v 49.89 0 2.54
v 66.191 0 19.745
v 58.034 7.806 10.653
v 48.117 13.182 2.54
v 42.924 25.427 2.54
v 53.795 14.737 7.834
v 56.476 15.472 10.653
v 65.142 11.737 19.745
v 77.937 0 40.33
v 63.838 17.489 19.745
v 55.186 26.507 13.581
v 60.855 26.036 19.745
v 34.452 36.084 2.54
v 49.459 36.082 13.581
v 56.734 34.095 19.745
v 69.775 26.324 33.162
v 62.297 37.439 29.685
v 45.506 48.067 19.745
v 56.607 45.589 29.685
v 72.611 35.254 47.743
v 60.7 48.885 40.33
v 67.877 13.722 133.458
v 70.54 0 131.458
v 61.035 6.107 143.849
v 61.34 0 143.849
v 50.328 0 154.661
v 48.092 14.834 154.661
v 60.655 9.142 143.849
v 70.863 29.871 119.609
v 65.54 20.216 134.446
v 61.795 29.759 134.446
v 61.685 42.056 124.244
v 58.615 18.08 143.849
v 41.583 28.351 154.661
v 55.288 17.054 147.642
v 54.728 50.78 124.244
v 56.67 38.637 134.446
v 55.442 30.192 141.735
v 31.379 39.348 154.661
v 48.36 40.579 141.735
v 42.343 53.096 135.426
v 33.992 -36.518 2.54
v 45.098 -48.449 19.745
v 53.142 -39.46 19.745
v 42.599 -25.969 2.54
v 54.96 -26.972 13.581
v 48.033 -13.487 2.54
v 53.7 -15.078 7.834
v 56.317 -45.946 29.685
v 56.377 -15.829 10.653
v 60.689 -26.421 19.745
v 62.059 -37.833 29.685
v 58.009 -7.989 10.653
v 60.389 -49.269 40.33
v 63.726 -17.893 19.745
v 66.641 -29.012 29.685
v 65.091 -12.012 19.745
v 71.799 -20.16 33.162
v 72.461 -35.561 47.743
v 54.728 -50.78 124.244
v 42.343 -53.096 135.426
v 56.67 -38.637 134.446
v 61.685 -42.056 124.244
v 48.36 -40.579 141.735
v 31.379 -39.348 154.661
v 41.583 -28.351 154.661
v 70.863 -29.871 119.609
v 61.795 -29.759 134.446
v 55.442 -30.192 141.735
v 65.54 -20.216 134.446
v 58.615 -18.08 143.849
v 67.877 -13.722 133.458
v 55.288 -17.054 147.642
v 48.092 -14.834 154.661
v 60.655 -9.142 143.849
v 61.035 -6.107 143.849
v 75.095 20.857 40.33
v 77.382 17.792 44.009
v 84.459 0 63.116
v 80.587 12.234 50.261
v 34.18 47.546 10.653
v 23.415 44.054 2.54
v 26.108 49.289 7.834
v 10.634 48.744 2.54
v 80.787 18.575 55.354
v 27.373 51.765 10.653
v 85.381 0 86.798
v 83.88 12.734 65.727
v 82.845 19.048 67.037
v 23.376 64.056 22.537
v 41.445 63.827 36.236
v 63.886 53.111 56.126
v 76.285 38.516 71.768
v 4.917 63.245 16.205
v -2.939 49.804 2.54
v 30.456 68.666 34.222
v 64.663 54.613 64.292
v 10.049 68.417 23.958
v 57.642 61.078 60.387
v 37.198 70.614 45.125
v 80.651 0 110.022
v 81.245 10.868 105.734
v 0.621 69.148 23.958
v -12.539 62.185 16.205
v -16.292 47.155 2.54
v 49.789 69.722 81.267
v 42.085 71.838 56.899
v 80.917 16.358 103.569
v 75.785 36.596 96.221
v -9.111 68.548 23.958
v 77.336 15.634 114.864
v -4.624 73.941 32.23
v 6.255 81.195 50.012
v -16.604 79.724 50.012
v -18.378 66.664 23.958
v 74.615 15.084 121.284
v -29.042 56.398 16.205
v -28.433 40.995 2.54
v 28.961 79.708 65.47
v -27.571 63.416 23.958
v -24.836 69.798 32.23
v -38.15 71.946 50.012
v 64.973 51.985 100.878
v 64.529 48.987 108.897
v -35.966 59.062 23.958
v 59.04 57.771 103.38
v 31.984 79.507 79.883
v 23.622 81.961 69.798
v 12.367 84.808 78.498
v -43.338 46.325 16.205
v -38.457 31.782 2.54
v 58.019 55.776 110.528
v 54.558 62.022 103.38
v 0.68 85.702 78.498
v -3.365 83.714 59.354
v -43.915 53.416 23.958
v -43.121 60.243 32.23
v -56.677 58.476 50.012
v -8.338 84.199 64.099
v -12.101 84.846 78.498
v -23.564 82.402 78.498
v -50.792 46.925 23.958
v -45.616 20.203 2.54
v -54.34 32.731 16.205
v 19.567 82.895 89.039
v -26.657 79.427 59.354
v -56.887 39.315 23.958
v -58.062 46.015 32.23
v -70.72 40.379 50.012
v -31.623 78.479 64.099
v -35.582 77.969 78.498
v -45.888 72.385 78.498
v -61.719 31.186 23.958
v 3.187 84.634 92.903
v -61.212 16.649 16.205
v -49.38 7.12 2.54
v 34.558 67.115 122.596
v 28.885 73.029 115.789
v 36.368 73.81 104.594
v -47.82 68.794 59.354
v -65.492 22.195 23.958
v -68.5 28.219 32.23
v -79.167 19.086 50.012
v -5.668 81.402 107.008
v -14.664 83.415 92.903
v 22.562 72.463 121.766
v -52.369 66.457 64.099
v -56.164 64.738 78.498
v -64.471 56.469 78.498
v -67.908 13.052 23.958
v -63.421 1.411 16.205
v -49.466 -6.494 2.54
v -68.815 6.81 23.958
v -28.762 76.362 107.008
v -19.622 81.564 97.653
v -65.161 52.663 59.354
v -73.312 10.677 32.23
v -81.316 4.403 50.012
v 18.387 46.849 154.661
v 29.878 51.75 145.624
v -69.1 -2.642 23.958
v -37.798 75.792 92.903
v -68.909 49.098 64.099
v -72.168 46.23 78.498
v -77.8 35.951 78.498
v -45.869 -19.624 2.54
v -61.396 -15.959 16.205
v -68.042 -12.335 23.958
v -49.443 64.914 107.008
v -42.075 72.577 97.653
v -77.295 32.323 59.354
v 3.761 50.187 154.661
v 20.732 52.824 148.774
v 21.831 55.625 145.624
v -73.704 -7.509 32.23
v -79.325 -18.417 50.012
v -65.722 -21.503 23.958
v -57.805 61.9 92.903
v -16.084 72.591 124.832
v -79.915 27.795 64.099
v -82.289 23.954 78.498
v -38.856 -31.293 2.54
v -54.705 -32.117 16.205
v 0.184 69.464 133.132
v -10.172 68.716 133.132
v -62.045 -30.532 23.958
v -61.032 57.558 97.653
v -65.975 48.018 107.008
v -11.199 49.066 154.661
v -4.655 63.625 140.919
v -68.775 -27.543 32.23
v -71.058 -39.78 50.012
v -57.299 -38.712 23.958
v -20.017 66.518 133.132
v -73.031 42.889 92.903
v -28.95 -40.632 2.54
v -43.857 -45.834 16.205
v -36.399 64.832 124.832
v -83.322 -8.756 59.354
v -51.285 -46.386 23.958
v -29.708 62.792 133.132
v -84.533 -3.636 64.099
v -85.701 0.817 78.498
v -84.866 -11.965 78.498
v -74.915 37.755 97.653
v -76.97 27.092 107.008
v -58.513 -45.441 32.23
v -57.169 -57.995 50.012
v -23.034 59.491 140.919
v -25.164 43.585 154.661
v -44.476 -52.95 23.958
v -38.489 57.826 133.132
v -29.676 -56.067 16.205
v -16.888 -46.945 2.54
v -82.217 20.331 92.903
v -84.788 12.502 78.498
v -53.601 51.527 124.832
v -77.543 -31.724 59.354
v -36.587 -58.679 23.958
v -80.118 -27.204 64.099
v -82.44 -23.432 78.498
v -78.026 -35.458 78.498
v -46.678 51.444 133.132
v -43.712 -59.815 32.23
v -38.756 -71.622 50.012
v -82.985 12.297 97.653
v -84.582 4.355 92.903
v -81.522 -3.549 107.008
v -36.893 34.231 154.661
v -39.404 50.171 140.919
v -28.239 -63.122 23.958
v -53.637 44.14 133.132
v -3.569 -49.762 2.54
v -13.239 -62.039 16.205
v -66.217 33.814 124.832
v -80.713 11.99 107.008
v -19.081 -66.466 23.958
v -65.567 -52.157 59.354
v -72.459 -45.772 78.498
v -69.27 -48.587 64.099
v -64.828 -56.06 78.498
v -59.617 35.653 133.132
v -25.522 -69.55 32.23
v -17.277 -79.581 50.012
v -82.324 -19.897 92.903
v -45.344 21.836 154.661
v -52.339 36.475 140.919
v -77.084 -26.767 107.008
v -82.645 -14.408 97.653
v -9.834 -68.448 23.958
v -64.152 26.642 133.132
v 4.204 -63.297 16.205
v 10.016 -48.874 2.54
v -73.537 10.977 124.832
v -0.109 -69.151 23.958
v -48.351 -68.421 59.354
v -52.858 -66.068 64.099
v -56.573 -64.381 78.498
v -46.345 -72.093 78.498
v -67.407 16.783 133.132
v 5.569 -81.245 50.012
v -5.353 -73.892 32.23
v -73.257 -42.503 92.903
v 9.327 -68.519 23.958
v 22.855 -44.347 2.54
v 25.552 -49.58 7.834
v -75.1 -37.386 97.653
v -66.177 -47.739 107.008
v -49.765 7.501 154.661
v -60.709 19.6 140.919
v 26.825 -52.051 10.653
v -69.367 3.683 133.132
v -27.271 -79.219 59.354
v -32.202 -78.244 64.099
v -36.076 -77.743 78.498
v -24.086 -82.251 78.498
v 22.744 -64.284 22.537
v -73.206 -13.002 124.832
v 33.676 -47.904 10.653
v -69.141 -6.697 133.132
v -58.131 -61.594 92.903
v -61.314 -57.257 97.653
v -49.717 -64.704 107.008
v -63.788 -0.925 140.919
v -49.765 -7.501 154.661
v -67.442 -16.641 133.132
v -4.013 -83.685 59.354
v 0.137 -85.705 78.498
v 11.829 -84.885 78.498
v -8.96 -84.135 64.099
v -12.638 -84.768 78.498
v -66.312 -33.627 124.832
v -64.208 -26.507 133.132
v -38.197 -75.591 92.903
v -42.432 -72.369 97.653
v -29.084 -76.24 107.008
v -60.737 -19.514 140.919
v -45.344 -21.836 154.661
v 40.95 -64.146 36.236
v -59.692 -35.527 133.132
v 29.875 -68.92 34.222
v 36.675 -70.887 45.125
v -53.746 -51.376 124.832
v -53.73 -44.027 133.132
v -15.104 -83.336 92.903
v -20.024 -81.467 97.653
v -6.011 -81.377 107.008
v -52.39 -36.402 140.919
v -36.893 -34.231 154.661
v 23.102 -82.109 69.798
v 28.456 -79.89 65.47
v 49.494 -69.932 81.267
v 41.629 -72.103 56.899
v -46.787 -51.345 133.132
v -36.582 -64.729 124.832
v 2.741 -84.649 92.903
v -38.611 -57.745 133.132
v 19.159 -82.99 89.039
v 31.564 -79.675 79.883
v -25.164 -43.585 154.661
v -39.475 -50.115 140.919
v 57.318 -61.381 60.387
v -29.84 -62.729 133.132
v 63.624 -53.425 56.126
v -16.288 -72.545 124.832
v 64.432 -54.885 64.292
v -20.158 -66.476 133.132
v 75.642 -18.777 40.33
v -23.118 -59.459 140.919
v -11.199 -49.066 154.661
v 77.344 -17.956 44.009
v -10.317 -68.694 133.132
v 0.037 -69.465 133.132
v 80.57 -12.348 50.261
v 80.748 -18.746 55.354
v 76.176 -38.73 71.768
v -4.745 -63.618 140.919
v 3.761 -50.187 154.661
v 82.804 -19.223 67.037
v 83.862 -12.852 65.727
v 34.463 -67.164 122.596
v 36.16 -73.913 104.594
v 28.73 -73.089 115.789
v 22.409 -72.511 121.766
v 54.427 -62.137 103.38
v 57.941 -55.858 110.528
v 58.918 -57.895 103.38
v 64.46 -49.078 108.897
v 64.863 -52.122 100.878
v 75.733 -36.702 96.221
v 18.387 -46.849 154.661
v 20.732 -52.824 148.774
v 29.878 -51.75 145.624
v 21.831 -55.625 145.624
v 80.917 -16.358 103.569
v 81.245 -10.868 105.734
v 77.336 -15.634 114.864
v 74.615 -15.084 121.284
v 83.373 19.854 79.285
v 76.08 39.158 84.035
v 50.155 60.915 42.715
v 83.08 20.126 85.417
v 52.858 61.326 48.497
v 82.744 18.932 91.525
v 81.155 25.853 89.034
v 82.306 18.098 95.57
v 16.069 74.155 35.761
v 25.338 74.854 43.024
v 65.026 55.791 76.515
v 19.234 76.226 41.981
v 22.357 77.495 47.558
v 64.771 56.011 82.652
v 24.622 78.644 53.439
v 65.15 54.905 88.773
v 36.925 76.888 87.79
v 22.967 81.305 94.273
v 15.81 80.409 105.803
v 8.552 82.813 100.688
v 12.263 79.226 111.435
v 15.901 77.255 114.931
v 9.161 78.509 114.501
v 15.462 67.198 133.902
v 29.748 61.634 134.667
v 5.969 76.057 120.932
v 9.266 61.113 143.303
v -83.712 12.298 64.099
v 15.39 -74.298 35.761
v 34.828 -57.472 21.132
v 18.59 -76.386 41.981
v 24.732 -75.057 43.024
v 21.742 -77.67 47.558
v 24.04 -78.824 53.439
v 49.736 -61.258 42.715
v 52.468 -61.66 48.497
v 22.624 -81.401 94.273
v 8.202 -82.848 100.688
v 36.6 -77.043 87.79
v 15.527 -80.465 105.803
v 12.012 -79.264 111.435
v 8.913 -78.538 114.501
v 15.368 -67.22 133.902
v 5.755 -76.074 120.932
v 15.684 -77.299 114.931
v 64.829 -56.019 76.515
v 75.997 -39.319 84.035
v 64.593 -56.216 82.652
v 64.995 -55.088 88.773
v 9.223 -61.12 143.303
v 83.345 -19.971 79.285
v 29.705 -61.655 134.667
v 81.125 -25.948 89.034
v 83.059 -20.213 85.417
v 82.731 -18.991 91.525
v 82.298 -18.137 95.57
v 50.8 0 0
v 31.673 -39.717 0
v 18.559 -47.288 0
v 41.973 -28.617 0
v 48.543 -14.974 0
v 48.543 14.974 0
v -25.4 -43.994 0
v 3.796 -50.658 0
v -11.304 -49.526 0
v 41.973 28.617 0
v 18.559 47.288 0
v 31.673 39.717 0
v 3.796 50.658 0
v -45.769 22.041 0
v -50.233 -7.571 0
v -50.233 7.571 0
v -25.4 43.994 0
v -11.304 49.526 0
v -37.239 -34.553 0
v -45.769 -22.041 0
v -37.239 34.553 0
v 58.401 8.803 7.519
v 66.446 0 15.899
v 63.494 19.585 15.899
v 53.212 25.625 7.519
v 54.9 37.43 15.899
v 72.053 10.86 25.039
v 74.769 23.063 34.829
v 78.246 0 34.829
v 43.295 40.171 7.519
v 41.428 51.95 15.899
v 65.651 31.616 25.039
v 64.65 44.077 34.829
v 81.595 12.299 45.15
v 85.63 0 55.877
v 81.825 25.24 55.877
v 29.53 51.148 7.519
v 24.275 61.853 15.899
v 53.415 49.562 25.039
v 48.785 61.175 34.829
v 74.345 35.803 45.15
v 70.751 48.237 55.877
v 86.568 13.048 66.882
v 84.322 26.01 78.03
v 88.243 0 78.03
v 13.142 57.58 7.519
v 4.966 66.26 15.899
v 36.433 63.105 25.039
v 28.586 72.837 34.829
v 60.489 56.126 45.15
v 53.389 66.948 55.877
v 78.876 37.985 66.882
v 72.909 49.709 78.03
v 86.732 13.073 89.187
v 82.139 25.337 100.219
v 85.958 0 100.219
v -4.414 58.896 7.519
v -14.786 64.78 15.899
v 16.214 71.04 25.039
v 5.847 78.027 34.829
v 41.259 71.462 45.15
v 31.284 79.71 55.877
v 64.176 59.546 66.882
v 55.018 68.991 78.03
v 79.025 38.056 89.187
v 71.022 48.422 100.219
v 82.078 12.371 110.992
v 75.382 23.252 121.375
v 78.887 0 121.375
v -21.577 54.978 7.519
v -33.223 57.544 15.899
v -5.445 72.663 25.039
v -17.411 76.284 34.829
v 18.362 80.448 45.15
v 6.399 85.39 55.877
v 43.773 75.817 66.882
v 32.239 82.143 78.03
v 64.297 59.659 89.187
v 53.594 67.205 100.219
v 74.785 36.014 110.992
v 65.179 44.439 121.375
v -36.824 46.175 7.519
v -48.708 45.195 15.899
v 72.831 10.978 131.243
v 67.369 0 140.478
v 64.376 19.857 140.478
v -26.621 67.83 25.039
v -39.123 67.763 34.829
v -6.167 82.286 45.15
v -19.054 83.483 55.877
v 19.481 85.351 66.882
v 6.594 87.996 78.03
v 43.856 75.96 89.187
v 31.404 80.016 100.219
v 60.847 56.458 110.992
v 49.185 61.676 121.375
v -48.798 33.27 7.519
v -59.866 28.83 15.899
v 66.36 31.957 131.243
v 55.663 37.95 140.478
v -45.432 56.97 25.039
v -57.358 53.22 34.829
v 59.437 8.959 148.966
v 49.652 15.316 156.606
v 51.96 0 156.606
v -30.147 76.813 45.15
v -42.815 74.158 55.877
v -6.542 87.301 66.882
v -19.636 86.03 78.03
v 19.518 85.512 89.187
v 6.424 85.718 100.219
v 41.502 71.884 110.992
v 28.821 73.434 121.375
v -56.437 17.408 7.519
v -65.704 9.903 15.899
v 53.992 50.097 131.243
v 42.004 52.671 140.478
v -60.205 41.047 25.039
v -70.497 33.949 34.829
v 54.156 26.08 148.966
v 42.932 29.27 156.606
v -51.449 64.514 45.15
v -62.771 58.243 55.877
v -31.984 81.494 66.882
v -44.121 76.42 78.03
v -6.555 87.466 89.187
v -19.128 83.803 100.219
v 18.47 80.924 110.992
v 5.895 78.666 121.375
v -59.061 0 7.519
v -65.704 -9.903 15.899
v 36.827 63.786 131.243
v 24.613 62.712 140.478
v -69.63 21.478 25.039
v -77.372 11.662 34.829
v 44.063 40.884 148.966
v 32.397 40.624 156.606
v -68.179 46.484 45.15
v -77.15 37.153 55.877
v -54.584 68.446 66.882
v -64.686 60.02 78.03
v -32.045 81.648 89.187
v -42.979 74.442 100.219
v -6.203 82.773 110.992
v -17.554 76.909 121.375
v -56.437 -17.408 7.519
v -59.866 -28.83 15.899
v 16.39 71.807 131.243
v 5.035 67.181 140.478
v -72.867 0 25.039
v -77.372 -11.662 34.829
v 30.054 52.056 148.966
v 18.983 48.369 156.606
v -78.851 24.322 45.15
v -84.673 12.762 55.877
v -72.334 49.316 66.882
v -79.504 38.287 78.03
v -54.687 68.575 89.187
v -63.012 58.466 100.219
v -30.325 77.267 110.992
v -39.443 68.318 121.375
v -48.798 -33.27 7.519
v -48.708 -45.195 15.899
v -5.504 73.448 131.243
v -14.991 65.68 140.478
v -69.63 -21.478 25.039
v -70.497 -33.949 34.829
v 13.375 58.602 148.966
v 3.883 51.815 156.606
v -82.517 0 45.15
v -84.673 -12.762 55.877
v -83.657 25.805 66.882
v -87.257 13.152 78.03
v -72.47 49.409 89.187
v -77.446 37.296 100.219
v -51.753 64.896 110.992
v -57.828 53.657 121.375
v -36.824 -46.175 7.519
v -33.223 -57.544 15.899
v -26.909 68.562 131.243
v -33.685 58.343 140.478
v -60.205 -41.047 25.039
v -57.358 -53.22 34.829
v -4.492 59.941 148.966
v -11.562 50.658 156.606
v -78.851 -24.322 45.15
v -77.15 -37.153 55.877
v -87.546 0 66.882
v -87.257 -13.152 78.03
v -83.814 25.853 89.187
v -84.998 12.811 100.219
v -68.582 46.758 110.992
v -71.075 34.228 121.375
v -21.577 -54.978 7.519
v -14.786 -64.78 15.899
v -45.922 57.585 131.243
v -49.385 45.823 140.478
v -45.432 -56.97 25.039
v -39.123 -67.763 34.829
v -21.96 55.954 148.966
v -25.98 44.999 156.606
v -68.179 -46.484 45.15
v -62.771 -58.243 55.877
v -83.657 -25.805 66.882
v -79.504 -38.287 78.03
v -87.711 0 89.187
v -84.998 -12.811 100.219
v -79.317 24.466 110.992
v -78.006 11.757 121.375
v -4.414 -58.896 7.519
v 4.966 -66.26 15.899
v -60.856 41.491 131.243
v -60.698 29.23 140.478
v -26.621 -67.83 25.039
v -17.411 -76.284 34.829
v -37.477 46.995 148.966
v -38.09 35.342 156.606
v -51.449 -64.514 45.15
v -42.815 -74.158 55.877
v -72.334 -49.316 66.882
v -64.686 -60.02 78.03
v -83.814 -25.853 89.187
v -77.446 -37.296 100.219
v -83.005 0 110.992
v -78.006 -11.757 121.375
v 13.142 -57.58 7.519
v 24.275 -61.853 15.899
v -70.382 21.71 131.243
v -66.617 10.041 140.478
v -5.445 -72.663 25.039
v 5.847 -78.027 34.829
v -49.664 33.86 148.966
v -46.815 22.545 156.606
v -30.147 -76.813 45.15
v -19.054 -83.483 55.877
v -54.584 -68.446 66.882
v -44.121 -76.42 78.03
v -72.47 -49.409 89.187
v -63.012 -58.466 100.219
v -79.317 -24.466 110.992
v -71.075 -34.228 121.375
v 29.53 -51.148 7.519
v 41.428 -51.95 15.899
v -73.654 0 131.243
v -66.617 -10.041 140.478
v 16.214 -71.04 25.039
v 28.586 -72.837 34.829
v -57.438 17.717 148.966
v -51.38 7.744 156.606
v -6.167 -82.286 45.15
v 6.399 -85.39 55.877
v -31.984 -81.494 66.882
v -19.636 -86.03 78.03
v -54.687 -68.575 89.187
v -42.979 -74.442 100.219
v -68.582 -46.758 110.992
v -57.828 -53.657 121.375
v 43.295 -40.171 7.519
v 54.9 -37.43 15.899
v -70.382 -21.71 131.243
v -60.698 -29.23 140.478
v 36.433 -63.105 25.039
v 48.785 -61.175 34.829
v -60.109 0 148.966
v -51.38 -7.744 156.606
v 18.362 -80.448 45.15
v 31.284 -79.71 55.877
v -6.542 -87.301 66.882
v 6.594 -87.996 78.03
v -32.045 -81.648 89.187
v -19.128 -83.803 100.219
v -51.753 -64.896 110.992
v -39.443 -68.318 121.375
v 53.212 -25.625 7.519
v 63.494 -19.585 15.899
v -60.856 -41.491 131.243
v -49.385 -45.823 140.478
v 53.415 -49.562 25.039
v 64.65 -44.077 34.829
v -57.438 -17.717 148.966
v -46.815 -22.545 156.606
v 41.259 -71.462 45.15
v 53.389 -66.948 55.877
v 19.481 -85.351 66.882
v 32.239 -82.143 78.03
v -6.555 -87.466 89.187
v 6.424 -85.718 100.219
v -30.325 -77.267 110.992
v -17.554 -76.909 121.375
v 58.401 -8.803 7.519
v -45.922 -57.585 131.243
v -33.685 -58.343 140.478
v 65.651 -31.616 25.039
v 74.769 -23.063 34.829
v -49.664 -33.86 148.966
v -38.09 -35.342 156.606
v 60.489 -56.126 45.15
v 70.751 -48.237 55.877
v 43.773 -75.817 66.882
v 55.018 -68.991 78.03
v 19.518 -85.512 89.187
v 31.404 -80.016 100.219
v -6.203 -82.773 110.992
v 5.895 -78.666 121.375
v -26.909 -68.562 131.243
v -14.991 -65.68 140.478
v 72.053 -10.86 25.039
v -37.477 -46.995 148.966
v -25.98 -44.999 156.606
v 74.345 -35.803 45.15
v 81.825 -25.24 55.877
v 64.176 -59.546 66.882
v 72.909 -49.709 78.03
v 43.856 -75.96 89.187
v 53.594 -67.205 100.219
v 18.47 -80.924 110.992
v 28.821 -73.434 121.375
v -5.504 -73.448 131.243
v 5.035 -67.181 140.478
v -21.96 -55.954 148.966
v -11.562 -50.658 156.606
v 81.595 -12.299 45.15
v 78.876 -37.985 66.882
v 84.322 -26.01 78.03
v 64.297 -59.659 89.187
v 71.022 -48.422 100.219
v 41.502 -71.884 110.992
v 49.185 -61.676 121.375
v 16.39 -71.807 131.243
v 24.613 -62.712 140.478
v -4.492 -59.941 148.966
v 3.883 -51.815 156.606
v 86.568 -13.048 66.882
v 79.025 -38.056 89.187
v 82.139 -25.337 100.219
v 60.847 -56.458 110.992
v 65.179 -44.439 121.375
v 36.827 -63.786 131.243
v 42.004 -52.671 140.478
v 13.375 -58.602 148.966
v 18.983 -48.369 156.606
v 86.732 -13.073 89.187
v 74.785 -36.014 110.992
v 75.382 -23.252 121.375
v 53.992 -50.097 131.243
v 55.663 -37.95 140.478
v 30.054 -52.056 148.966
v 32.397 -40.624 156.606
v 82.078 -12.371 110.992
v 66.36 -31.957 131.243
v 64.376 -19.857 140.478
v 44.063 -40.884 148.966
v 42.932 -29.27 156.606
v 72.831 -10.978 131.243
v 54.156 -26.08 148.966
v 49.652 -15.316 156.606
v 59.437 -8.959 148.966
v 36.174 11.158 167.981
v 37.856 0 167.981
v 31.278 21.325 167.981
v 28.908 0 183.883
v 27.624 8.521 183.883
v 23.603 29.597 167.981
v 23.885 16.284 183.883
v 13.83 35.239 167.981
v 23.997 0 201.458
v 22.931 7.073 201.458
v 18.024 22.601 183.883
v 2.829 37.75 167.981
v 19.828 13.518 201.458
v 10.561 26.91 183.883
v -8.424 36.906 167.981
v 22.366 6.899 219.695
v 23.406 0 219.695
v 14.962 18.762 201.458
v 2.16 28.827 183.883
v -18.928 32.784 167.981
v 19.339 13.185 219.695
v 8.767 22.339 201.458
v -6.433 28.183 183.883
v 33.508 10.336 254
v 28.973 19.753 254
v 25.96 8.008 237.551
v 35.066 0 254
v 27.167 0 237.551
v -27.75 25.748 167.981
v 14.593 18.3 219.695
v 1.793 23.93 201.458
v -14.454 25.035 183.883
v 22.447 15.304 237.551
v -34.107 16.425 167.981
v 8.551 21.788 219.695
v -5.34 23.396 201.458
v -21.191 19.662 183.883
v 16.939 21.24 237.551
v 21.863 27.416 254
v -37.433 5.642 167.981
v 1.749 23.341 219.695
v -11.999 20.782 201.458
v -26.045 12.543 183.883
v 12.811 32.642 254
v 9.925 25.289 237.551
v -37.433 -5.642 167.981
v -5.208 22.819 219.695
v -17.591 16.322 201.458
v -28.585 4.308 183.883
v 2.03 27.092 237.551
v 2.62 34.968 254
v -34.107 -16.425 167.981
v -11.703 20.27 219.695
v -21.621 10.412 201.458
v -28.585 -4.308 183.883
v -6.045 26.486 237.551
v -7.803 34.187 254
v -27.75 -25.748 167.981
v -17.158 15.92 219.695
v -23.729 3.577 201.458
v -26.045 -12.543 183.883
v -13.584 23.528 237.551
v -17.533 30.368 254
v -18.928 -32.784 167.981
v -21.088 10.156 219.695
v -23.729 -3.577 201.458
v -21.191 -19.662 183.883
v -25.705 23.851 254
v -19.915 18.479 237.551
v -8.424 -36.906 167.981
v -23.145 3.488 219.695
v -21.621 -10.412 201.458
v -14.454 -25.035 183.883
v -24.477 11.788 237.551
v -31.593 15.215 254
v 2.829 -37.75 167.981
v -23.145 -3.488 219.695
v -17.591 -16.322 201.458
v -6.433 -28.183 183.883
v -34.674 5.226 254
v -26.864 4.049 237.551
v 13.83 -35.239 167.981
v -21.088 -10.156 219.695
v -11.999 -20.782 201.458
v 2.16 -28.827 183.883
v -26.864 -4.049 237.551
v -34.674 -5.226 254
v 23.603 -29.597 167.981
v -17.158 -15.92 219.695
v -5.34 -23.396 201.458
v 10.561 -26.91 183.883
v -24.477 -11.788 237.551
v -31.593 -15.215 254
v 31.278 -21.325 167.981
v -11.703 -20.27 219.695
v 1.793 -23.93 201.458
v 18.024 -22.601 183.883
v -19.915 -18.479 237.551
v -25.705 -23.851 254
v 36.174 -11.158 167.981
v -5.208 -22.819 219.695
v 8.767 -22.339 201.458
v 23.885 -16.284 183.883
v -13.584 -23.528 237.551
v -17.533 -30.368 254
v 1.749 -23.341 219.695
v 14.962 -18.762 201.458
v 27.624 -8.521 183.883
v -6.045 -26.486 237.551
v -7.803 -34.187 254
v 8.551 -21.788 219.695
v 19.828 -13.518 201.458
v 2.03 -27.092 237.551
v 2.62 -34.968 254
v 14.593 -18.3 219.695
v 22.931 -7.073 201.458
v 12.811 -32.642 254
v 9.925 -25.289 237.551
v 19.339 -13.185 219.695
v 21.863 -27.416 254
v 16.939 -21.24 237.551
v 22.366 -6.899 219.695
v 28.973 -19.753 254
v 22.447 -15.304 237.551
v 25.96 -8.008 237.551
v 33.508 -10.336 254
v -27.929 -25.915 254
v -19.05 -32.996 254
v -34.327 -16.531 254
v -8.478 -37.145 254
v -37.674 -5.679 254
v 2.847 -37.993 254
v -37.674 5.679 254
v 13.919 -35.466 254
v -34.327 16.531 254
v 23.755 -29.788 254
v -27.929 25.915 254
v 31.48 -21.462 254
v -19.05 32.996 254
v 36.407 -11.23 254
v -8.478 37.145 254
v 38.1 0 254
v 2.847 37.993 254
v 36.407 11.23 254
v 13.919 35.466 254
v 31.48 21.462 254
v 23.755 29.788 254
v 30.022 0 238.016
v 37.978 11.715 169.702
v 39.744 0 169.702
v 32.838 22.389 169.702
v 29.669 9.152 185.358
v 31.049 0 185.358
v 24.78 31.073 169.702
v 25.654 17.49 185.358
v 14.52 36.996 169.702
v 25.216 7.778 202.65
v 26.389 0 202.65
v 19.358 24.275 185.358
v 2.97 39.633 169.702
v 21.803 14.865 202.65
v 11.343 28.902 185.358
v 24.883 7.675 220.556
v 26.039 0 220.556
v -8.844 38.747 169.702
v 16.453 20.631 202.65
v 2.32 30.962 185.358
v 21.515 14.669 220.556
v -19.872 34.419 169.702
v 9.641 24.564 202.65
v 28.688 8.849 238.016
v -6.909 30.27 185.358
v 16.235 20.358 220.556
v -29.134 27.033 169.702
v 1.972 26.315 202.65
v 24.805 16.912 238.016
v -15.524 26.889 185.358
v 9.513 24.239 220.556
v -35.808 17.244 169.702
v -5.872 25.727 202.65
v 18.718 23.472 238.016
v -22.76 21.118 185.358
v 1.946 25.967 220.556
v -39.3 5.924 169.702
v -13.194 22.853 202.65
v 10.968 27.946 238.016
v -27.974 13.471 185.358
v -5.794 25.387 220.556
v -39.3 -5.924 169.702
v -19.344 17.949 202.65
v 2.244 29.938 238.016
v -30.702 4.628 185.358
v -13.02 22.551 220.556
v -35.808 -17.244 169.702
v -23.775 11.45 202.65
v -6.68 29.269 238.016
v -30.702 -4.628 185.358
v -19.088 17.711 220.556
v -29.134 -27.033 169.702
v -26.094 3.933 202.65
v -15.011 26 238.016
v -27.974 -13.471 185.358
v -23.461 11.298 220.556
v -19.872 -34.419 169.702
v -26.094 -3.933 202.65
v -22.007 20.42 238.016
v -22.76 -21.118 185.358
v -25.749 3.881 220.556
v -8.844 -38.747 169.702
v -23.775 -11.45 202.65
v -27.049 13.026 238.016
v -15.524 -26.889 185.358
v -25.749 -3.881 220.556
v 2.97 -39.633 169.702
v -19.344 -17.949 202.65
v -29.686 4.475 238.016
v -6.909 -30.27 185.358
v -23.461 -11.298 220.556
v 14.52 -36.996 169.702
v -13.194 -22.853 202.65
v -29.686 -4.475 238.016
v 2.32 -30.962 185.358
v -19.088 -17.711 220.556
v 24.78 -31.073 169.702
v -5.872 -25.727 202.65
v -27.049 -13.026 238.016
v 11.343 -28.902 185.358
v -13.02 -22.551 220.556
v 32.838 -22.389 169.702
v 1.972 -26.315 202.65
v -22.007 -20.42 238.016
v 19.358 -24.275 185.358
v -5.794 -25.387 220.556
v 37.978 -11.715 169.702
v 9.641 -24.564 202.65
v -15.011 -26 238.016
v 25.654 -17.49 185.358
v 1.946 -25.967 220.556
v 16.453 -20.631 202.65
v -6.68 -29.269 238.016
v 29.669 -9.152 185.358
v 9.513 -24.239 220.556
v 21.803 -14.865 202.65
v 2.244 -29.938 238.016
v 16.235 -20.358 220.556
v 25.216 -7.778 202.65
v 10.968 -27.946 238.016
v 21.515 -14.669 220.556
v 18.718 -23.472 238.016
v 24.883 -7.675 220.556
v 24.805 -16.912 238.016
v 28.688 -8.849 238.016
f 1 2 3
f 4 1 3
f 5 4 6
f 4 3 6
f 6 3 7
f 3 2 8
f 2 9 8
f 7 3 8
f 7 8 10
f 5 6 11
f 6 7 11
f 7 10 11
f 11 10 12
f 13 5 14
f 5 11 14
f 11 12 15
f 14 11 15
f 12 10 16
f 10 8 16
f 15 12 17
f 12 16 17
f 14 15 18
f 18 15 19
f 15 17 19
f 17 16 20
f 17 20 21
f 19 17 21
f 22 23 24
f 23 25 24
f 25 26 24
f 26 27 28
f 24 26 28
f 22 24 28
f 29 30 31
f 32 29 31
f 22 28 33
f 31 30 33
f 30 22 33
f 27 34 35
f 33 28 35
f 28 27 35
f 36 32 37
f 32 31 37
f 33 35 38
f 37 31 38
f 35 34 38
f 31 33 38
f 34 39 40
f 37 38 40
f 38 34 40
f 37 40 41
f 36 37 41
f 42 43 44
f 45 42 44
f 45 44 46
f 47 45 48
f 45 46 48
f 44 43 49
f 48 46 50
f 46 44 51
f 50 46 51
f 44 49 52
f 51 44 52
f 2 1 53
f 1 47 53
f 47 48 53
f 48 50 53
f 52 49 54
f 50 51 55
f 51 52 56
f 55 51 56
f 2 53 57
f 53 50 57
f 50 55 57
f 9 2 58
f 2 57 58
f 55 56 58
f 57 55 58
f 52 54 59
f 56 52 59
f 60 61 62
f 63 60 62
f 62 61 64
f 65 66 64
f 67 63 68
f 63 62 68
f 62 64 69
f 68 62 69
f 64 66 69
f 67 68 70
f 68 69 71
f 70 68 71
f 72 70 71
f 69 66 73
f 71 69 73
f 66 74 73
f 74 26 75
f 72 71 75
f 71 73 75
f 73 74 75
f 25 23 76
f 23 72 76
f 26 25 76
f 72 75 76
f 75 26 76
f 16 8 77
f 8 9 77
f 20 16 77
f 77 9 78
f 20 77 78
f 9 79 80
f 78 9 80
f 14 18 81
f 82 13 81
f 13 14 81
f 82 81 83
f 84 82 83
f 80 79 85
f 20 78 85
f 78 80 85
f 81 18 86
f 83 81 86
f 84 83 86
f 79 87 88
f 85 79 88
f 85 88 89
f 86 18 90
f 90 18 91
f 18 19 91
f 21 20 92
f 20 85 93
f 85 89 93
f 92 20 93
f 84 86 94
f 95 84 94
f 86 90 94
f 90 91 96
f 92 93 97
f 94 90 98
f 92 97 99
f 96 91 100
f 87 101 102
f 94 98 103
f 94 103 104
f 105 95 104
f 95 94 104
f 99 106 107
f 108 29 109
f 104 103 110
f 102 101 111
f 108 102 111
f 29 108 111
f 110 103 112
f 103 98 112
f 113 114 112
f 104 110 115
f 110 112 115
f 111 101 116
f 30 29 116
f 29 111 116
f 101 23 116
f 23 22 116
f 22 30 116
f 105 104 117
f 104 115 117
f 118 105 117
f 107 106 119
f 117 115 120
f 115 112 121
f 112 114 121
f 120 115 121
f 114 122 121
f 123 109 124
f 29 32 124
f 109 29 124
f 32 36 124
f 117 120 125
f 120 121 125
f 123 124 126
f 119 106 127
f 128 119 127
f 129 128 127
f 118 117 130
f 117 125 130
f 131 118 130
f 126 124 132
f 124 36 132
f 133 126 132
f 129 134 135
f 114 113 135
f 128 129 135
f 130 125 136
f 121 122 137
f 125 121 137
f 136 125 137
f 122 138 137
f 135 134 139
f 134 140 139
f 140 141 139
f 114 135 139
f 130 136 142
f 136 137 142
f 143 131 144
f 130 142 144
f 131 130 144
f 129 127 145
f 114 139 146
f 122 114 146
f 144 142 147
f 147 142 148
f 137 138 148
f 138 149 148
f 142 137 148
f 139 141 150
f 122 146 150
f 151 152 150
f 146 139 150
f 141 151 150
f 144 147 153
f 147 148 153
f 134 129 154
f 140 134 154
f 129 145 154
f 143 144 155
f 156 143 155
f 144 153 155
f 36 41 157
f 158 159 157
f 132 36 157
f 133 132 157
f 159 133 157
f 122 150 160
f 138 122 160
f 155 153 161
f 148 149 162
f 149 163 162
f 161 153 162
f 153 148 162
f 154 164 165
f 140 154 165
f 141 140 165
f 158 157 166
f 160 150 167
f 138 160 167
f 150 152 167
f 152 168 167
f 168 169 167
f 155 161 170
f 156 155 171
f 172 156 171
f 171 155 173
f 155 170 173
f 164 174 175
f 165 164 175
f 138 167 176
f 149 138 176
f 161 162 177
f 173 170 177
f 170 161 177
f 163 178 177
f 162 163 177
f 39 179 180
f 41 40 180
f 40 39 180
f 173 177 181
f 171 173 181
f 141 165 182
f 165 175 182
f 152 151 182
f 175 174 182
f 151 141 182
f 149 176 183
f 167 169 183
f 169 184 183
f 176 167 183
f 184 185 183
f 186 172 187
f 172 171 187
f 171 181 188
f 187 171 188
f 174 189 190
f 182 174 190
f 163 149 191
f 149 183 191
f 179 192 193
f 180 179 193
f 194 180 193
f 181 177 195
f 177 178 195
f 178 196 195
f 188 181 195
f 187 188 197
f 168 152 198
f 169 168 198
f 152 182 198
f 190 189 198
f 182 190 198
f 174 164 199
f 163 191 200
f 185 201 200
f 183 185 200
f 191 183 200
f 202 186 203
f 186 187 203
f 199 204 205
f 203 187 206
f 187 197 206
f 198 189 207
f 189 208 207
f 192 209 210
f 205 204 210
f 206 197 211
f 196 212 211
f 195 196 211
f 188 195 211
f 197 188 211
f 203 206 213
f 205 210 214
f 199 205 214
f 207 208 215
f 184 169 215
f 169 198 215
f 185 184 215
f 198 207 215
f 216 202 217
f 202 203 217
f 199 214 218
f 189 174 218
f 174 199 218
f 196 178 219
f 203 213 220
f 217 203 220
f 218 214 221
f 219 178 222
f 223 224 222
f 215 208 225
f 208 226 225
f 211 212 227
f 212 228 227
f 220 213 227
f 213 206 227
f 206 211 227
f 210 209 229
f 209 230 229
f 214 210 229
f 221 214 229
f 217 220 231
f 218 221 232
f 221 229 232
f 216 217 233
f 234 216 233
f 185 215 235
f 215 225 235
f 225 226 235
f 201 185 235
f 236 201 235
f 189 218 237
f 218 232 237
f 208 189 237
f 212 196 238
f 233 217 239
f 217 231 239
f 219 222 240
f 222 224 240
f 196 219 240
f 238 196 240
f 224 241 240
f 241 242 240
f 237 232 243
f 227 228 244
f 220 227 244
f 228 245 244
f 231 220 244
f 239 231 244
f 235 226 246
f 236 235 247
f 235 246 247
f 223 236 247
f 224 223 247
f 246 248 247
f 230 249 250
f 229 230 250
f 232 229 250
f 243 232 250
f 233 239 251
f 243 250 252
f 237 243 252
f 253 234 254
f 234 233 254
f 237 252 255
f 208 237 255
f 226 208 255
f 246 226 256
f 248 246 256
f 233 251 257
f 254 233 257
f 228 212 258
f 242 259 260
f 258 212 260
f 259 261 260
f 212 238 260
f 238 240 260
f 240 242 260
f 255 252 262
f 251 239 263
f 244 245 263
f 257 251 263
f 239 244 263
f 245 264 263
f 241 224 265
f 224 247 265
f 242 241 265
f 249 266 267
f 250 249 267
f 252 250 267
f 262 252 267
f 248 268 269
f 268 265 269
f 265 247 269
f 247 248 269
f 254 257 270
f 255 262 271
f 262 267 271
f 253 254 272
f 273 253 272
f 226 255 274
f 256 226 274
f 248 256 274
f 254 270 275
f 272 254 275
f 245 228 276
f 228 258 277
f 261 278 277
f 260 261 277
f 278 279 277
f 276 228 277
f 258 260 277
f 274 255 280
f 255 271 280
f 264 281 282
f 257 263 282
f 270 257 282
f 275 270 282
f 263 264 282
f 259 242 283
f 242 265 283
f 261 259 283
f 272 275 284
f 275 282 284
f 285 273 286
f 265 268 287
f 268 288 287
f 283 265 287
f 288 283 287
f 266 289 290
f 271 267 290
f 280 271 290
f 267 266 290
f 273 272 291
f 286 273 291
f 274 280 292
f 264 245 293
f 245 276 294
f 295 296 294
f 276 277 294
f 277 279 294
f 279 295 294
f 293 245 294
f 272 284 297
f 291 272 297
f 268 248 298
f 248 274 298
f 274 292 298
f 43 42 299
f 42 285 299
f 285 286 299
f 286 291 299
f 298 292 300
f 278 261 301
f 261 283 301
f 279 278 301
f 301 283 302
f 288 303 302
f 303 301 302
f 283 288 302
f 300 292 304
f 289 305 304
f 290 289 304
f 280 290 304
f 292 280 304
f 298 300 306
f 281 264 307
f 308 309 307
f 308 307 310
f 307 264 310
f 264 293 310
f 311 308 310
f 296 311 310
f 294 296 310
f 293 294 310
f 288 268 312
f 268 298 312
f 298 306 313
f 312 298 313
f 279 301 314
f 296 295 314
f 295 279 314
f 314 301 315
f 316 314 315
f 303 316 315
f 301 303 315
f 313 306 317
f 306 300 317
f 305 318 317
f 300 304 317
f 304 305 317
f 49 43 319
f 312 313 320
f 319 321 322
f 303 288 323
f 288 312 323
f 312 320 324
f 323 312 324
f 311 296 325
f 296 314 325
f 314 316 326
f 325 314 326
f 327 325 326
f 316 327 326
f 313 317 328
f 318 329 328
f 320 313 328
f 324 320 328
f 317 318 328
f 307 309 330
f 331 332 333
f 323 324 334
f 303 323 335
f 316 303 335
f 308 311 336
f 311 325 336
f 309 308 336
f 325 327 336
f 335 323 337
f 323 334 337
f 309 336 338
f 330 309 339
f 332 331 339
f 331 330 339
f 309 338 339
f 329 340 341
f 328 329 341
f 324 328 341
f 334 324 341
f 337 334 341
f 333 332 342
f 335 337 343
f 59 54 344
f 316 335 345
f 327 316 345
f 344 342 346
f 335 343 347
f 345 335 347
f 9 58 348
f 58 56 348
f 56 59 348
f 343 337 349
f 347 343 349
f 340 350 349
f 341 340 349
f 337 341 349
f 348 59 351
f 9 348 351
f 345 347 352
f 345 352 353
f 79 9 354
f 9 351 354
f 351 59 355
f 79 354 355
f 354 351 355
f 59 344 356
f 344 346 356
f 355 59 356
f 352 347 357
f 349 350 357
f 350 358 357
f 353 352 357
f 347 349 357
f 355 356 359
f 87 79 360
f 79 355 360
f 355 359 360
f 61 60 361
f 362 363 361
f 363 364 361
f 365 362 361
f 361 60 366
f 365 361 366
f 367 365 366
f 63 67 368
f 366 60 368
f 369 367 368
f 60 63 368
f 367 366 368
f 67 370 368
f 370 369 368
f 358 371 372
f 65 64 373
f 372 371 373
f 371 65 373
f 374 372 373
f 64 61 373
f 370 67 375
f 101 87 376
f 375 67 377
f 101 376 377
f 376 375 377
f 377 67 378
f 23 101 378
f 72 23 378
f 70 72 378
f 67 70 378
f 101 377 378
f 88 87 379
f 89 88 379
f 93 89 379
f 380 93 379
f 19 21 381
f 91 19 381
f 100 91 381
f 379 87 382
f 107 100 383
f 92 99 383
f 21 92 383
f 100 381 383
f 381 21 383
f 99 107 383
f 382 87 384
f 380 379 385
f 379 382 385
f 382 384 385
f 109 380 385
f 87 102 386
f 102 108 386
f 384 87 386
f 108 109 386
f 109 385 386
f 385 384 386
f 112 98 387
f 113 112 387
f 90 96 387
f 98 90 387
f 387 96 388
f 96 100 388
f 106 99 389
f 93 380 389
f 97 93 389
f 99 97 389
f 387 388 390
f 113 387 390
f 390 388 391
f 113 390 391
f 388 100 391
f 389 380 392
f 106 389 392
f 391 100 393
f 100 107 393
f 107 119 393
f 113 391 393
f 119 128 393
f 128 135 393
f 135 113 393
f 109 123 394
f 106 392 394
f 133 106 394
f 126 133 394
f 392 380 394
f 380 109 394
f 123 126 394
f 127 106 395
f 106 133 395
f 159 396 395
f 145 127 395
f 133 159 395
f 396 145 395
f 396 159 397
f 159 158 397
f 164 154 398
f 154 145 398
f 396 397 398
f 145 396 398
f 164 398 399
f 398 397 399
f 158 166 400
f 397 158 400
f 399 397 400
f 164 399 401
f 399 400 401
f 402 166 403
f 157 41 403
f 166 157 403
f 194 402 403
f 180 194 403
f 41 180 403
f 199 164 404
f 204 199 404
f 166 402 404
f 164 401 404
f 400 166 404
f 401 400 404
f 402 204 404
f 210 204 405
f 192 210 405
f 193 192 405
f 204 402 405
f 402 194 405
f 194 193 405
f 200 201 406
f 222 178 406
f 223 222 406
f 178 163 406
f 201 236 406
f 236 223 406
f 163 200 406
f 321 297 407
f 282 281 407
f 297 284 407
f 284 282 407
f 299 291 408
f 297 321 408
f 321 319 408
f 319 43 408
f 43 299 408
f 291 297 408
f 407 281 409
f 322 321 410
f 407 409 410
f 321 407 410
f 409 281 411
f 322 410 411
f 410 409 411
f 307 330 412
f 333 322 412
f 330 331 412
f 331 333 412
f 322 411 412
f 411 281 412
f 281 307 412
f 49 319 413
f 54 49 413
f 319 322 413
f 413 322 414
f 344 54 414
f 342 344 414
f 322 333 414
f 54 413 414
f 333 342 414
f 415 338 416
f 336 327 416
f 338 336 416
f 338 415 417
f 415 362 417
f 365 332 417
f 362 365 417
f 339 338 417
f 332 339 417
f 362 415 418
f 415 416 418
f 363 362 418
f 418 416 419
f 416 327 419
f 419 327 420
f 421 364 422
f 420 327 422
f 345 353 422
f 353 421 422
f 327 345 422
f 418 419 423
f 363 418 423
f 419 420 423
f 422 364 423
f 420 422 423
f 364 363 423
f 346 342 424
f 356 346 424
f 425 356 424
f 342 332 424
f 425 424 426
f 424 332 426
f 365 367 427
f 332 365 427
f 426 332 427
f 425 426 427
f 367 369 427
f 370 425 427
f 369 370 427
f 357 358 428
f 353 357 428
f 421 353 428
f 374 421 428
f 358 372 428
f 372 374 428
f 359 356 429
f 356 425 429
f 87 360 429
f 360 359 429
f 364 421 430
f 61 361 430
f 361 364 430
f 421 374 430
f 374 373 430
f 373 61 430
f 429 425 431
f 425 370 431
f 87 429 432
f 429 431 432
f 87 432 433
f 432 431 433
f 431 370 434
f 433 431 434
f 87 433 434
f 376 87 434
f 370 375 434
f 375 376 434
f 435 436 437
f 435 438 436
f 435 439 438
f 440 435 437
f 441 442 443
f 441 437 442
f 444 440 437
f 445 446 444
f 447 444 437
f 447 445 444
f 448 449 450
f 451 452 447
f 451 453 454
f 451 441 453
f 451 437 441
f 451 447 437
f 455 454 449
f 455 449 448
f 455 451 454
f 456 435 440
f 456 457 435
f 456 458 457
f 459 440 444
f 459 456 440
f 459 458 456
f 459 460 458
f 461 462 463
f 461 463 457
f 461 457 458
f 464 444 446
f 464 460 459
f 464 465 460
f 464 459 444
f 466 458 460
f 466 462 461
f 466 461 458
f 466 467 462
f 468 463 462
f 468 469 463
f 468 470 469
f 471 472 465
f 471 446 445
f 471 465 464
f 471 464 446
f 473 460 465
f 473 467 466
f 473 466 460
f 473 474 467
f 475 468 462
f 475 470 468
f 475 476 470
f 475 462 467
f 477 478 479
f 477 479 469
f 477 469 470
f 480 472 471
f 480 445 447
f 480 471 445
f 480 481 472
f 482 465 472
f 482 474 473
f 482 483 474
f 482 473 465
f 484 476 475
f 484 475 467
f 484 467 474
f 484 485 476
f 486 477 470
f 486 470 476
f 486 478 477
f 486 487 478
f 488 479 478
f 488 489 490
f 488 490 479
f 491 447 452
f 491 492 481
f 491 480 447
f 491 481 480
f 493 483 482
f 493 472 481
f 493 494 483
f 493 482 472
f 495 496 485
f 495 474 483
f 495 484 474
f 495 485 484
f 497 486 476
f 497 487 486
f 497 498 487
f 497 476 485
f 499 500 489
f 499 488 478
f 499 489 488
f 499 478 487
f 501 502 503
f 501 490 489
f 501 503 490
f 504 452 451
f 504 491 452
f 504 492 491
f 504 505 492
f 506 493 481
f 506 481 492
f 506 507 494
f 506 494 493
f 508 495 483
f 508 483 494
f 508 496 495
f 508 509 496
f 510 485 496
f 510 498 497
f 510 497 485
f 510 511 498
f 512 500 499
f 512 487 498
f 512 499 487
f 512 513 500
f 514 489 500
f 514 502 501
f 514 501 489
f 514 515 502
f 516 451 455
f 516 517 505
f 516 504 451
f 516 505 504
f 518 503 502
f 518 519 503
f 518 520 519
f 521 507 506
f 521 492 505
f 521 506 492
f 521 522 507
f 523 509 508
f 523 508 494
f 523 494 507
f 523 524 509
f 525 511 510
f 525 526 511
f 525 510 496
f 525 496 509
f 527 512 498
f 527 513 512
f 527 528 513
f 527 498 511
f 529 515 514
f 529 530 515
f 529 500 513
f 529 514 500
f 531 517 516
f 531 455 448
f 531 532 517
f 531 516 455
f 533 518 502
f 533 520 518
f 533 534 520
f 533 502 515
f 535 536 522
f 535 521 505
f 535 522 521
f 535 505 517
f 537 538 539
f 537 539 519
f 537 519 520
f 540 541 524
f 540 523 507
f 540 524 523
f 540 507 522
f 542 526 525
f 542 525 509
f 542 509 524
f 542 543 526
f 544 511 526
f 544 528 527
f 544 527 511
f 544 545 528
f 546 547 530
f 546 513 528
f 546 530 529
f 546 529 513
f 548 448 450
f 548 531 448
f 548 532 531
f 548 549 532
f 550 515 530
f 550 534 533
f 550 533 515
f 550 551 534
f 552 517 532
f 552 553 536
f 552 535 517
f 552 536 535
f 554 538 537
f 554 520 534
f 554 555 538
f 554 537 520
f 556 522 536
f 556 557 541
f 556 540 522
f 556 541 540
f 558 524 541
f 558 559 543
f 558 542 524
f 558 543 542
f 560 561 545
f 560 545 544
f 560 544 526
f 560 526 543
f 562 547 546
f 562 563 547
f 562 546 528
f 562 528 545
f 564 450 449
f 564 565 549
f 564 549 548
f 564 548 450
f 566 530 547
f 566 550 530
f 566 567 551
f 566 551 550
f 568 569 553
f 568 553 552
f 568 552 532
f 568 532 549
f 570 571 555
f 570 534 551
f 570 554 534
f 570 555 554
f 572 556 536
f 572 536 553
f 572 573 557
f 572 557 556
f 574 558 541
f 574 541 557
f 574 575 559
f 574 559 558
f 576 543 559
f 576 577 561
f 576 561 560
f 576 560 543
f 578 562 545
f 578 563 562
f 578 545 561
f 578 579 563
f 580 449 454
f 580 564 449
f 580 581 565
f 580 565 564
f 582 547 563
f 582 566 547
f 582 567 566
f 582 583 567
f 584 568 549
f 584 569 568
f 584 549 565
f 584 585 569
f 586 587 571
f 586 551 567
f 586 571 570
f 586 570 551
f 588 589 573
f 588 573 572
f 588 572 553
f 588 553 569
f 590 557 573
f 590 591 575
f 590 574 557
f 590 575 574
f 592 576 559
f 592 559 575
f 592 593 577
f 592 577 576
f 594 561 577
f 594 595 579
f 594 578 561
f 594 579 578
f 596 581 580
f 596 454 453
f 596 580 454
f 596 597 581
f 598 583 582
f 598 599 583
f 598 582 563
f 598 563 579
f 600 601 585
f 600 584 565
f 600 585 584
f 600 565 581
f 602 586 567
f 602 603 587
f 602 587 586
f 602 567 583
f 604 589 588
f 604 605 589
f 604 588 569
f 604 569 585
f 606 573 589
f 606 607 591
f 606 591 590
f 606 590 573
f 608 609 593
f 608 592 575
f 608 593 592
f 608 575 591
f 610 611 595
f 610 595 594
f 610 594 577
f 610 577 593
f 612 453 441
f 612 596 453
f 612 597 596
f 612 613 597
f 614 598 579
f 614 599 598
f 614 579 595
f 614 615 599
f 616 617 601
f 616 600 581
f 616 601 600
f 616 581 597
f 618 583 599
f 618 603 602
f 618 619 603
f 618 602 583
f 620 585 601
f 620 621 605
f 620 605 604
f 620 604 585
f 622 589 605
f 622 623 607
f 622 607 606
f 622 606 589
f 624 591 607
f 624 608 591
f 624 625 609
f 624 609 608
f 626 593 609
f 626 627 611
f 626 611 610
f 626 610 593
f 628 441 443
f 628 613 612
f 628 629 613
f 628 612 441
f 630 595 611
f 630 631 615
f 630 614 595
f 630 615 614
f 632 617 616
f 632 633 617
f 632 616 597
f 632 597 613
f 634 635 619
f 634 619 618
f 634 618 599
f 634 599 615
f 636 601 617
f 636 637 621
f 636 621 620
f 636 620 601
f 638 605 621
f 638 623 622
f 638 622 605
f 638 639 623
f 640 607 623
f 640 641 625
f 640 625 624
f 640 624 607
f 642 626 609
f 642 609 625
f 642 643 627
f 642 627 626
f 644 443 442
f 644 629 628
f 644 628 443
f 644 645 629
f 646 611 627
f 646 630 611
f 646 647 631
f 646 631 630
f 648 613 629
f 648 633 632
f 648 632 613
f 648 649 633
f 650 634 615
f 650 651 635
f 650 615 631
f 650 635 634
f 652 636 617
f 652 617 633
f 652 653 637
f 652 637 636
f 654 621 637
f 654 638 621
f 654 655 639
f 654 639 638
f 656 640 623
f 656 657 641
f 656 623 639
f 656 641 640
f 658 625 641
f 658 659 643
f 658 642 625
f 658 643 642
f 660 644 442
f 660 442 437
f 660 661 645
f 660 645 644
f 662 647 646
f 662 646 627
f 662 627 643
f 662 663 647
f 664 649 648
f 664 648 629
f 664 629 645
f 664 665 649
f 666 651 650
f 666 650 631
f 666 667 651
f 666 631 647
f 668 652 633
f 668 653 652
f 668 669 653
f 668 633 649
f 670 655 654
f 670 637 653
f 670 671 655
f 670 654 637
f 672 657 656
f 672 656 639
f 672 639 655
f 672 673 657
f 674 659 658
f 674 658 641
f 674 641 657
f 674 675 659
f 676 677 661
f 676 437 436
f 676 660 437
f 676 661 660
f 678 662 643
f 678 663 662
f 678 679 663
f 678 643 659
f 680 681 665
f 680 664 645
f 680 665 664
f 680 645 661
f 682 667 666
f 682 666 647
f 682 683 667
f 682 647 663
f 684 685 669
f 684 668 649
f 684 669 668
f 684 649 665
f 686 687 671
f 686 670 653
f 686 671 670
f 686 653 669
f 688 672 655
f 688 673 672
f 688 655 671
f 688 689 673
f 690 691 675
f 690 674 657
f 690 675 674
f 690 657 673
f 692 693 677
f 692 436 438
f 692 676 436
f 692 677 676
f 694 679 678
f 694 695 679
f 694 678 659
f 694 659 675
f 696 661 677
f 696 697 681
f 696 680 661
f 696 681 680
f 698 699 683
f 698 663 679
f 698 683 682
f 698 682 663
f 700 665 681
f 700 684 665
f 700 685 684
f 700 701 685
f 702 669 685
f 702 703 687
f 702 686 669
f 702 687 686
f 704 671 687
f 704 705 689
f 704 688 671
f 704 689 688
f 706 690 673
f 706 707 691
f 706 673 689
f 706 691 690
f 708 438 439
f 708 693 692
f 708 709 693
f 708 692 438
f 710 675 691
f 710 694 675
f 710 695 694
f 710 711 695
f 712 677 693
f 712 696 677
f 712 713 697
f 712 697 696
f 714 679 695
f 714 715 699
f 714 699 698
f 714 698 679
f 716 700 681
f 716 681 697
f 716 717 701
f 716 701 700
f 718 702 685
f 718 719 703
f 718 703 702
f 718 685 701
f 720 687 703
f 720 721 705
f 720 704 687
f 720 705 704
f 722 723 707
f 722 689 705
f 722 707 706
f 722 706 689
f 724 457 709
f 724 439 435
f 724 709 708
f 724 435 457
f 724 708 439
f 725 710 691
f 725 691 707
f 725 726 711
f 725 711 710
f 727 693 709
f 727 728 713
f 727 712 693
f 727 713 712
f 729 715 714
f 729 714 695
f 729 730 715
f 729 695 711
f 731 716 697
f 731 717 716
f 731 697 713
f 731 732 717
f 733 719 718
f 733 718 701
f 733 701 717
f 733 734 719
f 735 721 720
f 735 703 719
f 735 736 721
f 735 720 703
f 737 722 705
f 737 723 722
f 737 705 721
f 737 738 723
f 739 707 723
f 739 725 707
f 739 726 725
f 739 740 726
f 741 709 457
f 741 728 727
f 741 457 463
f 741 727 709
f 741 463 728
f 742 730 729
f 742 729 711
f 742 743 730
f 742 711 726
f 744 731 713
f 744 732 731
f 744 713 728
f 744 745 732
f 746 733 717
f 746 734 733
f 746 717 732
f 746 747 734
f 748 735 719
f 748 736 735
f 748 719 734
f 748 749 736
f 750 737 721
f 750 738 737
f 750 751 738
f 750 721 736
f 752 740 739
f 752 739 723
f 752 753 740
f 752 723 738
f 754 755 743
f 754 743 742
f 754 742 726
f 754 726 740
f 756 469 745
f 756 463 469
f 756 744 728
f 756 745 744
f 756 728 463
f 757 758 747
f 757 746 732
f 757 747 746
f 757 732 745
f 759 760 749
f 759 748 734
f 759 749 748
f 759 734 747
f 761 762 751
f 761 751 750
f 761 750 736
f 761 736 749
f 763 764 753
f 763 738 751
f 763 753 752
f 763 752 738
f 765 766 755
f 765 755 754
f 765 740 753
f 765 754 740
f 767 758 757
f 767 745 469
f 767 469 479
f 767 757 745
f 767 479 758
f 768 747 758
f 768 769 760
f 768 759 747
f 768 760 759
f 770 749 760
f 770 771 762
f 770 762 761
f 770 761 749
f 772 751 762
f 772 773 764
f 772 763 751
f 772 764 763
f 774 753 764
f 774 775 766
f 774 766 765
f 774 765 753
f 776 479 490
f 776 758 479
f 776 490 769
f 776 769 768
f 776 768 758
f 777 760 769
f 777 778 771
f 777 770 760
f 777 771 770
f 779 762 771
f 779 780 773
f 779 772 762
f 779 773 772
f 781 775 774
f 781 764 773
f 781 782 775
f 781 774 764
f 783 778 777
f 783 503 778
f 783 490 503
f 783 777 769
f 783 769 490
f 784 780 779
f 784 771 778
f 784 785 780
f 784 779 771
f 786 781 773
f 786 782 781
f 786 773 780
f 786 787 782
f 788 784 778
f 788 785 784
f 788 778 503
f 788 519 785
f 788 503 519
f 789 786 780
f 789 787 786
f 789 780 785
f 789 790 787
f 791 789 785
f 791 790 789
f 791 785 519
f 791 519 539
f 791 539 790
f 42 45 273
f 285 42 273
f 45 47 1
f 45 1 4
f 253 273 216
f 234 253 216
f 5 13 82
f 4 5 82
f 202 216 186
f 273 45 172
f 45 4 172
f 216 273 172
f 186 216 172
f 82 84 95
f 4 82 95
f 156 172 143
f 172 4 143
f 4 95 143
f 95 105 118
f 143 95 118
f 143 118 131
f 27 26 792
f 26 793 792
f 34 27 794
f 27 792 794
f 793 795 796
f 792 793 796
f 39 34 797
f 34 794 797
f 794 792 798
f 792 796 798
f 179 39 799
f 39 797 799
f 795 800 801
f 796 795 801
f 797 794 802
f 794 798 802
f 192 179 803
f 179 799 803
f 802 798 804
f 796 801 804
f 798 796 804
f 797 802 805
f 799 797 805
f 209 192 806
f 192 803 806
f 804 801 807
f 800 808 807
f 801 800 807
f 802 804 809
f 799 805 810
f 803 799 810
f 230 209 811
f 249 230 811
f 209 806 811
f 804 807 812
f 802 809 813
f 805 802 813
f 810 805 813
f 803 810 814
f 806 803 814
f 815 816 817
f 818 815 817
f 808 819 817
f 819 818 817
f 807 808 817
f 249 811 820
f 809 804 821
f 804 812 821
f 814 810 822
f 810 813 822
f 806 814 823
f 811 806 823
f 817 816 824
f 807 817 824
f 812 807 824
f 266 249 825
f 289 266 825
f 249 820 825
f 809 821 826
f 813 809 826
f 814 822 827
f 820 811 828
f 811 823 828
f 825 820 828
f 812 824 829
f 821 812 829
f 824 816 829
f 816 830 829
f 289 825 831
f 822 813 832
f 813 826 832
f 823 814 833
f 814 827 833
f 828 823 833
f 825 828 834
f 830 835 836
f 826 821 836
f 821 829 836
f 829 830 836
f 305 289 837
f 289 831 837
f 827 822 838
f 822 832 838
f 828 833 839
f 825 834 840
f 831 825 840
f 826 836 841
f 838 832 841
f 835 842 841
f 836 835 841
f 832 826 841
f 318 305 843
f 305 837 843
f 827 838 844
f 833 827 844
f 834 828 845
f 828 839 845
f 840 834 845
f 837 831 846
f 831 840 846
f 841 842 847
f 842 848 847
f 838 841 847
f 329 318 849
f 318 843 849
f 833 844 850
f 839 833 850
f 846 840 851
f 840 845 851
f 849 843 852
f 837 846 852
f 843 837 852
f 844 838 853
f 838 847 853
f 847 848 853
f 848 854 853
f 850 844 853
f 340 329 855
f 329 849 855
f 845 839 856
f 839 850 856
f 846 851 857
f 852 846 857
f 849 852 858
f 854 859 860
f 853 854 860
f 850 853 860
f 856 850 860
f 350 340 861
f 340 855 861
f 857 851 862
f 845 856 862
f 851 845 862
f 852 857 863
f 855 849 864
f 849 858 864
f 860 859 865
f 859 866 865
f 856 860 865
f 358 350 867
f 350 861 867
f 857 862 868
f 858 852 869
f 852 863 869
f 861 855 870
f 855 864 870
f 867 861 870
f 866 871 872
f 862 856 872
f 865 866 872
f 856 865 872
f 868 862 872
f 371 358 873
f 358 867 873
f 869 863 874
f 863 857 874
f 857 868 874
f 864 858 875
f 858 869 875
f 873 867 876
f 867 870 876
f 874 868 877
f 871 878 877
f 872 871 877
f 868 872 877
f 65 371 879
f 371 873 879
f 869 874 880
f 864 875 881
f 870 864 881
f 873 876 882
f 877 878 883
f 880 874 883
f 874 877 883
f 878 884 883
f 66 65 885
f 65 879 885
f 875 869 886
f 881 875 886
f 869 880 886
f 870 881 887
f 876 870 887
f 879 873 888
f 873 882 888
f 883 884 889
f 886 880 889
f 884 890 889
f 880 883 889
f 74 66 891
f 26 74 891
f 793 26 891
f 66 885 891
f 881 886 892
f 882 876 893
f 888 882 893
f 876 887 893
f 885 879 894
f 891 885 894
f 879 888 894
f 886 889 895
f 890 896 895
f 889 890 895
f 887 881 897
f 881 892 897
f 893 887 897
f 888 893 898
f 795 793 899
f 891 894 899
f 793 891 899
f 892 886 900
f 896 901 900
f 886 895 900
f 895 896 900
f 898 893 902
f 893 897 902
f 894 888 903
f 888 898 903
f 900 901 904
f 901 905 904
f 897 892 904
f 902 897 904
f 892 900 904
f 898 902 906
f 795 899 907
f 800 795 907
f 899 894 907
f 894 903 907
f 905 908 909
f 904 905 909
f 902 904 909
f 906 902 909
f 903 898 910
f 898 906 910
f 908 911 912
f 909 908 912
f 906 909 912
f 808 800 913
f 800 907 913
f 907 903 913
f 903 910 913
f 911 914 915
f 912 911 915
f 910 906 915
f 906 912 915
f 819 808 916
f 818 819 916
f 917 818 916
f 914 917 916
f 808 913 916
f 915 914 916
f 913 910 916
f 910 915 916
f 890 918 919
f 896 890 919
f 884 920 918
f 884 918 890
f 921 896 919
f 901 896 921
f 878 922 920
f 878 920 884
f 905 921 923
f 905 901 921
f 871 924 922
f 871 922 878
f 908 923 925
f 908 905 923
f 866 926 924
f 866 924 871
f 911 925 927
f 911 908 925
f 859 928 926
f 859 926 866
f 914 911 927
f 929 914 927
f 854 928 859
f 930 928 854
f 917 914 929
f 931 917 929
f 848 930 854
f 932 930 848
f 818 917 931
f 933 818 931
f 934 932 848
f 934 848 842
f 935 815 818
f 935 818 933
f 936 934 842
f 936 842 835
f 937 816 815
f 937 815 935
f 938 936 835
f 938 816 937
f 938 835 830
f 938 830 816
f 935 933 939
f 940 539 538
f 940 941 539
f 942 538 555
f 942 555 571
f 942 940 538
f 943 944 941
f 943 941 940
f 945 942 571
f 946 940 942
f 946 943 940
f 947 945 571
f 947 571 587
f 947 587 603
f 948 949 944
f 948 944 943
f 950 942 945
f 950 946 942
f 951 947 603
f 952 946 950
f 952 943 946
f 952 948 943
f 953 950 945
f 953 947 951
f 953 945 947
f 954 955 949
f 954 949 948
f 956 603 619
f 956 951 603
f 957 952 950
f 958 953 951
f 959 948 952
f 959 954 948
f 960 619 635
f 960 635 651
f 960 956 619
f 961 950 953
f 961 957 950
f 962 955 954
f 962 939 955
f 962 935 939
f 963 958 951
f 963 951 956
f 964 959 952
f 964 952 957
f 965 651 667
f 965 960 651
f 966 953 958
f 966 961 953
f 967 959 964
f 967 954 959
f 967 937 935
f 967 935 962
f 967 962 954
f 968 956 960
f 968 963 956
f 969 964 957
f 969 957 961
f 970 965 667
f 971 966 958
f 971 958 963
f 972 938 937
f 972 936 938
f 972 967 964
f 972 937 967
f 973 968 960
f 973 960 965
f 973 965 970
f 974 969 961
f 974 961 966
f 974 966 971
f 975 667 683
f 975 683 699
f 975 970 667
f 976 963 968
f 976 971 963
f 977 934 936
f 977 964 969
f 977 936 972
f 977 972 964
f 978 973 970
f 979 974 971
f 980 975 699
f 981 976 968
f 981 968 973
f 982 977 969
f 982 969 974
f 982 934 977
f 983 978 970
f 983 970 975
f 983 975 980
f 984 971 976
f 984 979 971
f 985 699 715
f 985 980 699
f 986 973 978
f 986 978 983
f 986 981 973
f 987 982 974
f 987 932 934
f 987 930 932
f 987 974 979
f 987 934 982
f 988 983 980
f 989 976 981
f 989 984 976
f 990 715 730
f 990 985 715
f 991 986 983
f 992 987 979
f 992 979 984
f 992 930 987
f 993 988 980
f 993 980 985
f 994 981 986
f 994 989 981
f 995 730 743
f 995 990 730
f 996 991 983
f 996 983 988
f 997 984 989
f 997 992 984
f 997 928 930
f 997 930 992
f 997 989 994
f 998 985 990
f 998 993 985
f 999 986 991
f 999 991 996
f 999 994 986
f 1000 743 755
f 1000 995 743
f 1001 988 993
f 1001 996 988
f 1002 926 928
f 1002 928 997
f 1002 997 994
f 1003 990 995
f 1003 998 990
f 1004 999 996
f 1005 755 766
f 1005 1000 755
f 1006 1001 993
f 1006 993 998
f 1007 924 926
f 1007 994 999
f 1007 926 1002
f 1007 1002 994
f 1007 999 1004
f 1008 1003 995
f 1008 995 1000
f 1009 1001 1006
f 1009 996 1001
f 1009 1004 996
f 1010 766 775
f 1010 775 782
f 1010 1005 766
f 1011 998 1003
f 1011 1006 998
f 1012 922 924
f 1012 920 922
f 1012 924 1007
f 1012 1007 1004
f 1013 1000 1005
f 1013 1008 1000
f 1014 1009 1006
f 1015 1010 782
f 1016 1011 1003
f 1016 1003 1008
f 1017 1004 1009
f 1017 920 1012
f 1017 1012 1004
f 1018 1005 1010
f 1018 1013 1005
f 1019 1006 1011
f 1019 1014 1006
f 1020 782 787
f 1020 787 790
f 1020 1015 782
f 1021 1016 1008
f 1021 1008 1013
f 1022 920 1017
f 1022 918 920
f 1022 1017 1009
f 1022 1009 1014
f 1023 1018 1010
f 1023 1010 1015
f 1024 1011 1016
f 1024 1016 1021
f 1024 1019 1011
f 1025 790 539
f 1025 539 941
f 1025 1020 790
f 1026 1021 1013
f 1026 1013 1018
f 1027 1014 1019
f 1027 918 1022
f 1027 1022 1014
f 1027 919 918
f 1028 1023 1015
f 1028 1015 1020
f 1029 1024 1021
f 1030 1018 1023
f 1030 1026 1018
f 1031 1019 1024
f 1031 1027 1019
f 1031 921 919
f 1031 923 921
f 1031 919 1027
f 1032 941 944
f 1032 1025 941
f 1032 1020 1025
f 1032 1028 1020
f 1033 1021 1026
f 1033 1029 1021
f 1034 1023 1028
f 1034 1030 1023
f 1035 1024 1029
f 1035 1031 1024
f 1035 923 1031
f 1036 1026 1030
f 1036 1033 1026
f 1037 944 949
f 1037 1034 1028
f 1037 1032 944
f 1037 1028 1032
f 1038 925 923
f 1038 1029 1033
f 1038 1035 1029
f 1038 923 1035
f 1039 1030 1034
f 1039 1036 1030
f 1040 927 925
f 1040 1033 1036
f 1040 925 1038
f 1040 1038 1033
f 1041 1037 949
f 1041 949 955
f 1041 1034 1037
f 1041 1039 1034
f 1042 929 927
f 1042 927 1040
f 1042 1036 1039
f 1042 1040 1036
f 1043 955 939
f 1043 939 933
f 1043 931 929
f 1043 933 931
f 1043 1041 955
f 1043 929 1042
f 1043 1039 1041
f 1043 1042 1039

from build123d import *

# Parameters (mm, degrees)
F2_T = -2.54


with BuildPart() as f1:
    # F0 (on Front) → F1 (revolve)
    with BuildSketch(Plane.XZ):
        with BuildLine():
            Line((0, 254), (0, 0))
            Line((0, 0), (50.8, 0))
            ThreePointArc((50.8, 0), (88.242603, 78.030083), (51.960435, 156.606457))
            ThreePointArc((51.960435, 156.606457), (26.388624, 202.650274), (38.1, 254))
            Line((38.1, 254), (0, 254))
        make_face()
    revolve(axis=Axis((0, 0, 127), (0, 0, 1)))

    # F2
    f2_openings = [f1.faces().sort_by_distance(p)[0] for p in [
        (0, 0, 254),
    ]]
    offset(amount=F2_T, openings=f2_openings)


solid = f1.part
